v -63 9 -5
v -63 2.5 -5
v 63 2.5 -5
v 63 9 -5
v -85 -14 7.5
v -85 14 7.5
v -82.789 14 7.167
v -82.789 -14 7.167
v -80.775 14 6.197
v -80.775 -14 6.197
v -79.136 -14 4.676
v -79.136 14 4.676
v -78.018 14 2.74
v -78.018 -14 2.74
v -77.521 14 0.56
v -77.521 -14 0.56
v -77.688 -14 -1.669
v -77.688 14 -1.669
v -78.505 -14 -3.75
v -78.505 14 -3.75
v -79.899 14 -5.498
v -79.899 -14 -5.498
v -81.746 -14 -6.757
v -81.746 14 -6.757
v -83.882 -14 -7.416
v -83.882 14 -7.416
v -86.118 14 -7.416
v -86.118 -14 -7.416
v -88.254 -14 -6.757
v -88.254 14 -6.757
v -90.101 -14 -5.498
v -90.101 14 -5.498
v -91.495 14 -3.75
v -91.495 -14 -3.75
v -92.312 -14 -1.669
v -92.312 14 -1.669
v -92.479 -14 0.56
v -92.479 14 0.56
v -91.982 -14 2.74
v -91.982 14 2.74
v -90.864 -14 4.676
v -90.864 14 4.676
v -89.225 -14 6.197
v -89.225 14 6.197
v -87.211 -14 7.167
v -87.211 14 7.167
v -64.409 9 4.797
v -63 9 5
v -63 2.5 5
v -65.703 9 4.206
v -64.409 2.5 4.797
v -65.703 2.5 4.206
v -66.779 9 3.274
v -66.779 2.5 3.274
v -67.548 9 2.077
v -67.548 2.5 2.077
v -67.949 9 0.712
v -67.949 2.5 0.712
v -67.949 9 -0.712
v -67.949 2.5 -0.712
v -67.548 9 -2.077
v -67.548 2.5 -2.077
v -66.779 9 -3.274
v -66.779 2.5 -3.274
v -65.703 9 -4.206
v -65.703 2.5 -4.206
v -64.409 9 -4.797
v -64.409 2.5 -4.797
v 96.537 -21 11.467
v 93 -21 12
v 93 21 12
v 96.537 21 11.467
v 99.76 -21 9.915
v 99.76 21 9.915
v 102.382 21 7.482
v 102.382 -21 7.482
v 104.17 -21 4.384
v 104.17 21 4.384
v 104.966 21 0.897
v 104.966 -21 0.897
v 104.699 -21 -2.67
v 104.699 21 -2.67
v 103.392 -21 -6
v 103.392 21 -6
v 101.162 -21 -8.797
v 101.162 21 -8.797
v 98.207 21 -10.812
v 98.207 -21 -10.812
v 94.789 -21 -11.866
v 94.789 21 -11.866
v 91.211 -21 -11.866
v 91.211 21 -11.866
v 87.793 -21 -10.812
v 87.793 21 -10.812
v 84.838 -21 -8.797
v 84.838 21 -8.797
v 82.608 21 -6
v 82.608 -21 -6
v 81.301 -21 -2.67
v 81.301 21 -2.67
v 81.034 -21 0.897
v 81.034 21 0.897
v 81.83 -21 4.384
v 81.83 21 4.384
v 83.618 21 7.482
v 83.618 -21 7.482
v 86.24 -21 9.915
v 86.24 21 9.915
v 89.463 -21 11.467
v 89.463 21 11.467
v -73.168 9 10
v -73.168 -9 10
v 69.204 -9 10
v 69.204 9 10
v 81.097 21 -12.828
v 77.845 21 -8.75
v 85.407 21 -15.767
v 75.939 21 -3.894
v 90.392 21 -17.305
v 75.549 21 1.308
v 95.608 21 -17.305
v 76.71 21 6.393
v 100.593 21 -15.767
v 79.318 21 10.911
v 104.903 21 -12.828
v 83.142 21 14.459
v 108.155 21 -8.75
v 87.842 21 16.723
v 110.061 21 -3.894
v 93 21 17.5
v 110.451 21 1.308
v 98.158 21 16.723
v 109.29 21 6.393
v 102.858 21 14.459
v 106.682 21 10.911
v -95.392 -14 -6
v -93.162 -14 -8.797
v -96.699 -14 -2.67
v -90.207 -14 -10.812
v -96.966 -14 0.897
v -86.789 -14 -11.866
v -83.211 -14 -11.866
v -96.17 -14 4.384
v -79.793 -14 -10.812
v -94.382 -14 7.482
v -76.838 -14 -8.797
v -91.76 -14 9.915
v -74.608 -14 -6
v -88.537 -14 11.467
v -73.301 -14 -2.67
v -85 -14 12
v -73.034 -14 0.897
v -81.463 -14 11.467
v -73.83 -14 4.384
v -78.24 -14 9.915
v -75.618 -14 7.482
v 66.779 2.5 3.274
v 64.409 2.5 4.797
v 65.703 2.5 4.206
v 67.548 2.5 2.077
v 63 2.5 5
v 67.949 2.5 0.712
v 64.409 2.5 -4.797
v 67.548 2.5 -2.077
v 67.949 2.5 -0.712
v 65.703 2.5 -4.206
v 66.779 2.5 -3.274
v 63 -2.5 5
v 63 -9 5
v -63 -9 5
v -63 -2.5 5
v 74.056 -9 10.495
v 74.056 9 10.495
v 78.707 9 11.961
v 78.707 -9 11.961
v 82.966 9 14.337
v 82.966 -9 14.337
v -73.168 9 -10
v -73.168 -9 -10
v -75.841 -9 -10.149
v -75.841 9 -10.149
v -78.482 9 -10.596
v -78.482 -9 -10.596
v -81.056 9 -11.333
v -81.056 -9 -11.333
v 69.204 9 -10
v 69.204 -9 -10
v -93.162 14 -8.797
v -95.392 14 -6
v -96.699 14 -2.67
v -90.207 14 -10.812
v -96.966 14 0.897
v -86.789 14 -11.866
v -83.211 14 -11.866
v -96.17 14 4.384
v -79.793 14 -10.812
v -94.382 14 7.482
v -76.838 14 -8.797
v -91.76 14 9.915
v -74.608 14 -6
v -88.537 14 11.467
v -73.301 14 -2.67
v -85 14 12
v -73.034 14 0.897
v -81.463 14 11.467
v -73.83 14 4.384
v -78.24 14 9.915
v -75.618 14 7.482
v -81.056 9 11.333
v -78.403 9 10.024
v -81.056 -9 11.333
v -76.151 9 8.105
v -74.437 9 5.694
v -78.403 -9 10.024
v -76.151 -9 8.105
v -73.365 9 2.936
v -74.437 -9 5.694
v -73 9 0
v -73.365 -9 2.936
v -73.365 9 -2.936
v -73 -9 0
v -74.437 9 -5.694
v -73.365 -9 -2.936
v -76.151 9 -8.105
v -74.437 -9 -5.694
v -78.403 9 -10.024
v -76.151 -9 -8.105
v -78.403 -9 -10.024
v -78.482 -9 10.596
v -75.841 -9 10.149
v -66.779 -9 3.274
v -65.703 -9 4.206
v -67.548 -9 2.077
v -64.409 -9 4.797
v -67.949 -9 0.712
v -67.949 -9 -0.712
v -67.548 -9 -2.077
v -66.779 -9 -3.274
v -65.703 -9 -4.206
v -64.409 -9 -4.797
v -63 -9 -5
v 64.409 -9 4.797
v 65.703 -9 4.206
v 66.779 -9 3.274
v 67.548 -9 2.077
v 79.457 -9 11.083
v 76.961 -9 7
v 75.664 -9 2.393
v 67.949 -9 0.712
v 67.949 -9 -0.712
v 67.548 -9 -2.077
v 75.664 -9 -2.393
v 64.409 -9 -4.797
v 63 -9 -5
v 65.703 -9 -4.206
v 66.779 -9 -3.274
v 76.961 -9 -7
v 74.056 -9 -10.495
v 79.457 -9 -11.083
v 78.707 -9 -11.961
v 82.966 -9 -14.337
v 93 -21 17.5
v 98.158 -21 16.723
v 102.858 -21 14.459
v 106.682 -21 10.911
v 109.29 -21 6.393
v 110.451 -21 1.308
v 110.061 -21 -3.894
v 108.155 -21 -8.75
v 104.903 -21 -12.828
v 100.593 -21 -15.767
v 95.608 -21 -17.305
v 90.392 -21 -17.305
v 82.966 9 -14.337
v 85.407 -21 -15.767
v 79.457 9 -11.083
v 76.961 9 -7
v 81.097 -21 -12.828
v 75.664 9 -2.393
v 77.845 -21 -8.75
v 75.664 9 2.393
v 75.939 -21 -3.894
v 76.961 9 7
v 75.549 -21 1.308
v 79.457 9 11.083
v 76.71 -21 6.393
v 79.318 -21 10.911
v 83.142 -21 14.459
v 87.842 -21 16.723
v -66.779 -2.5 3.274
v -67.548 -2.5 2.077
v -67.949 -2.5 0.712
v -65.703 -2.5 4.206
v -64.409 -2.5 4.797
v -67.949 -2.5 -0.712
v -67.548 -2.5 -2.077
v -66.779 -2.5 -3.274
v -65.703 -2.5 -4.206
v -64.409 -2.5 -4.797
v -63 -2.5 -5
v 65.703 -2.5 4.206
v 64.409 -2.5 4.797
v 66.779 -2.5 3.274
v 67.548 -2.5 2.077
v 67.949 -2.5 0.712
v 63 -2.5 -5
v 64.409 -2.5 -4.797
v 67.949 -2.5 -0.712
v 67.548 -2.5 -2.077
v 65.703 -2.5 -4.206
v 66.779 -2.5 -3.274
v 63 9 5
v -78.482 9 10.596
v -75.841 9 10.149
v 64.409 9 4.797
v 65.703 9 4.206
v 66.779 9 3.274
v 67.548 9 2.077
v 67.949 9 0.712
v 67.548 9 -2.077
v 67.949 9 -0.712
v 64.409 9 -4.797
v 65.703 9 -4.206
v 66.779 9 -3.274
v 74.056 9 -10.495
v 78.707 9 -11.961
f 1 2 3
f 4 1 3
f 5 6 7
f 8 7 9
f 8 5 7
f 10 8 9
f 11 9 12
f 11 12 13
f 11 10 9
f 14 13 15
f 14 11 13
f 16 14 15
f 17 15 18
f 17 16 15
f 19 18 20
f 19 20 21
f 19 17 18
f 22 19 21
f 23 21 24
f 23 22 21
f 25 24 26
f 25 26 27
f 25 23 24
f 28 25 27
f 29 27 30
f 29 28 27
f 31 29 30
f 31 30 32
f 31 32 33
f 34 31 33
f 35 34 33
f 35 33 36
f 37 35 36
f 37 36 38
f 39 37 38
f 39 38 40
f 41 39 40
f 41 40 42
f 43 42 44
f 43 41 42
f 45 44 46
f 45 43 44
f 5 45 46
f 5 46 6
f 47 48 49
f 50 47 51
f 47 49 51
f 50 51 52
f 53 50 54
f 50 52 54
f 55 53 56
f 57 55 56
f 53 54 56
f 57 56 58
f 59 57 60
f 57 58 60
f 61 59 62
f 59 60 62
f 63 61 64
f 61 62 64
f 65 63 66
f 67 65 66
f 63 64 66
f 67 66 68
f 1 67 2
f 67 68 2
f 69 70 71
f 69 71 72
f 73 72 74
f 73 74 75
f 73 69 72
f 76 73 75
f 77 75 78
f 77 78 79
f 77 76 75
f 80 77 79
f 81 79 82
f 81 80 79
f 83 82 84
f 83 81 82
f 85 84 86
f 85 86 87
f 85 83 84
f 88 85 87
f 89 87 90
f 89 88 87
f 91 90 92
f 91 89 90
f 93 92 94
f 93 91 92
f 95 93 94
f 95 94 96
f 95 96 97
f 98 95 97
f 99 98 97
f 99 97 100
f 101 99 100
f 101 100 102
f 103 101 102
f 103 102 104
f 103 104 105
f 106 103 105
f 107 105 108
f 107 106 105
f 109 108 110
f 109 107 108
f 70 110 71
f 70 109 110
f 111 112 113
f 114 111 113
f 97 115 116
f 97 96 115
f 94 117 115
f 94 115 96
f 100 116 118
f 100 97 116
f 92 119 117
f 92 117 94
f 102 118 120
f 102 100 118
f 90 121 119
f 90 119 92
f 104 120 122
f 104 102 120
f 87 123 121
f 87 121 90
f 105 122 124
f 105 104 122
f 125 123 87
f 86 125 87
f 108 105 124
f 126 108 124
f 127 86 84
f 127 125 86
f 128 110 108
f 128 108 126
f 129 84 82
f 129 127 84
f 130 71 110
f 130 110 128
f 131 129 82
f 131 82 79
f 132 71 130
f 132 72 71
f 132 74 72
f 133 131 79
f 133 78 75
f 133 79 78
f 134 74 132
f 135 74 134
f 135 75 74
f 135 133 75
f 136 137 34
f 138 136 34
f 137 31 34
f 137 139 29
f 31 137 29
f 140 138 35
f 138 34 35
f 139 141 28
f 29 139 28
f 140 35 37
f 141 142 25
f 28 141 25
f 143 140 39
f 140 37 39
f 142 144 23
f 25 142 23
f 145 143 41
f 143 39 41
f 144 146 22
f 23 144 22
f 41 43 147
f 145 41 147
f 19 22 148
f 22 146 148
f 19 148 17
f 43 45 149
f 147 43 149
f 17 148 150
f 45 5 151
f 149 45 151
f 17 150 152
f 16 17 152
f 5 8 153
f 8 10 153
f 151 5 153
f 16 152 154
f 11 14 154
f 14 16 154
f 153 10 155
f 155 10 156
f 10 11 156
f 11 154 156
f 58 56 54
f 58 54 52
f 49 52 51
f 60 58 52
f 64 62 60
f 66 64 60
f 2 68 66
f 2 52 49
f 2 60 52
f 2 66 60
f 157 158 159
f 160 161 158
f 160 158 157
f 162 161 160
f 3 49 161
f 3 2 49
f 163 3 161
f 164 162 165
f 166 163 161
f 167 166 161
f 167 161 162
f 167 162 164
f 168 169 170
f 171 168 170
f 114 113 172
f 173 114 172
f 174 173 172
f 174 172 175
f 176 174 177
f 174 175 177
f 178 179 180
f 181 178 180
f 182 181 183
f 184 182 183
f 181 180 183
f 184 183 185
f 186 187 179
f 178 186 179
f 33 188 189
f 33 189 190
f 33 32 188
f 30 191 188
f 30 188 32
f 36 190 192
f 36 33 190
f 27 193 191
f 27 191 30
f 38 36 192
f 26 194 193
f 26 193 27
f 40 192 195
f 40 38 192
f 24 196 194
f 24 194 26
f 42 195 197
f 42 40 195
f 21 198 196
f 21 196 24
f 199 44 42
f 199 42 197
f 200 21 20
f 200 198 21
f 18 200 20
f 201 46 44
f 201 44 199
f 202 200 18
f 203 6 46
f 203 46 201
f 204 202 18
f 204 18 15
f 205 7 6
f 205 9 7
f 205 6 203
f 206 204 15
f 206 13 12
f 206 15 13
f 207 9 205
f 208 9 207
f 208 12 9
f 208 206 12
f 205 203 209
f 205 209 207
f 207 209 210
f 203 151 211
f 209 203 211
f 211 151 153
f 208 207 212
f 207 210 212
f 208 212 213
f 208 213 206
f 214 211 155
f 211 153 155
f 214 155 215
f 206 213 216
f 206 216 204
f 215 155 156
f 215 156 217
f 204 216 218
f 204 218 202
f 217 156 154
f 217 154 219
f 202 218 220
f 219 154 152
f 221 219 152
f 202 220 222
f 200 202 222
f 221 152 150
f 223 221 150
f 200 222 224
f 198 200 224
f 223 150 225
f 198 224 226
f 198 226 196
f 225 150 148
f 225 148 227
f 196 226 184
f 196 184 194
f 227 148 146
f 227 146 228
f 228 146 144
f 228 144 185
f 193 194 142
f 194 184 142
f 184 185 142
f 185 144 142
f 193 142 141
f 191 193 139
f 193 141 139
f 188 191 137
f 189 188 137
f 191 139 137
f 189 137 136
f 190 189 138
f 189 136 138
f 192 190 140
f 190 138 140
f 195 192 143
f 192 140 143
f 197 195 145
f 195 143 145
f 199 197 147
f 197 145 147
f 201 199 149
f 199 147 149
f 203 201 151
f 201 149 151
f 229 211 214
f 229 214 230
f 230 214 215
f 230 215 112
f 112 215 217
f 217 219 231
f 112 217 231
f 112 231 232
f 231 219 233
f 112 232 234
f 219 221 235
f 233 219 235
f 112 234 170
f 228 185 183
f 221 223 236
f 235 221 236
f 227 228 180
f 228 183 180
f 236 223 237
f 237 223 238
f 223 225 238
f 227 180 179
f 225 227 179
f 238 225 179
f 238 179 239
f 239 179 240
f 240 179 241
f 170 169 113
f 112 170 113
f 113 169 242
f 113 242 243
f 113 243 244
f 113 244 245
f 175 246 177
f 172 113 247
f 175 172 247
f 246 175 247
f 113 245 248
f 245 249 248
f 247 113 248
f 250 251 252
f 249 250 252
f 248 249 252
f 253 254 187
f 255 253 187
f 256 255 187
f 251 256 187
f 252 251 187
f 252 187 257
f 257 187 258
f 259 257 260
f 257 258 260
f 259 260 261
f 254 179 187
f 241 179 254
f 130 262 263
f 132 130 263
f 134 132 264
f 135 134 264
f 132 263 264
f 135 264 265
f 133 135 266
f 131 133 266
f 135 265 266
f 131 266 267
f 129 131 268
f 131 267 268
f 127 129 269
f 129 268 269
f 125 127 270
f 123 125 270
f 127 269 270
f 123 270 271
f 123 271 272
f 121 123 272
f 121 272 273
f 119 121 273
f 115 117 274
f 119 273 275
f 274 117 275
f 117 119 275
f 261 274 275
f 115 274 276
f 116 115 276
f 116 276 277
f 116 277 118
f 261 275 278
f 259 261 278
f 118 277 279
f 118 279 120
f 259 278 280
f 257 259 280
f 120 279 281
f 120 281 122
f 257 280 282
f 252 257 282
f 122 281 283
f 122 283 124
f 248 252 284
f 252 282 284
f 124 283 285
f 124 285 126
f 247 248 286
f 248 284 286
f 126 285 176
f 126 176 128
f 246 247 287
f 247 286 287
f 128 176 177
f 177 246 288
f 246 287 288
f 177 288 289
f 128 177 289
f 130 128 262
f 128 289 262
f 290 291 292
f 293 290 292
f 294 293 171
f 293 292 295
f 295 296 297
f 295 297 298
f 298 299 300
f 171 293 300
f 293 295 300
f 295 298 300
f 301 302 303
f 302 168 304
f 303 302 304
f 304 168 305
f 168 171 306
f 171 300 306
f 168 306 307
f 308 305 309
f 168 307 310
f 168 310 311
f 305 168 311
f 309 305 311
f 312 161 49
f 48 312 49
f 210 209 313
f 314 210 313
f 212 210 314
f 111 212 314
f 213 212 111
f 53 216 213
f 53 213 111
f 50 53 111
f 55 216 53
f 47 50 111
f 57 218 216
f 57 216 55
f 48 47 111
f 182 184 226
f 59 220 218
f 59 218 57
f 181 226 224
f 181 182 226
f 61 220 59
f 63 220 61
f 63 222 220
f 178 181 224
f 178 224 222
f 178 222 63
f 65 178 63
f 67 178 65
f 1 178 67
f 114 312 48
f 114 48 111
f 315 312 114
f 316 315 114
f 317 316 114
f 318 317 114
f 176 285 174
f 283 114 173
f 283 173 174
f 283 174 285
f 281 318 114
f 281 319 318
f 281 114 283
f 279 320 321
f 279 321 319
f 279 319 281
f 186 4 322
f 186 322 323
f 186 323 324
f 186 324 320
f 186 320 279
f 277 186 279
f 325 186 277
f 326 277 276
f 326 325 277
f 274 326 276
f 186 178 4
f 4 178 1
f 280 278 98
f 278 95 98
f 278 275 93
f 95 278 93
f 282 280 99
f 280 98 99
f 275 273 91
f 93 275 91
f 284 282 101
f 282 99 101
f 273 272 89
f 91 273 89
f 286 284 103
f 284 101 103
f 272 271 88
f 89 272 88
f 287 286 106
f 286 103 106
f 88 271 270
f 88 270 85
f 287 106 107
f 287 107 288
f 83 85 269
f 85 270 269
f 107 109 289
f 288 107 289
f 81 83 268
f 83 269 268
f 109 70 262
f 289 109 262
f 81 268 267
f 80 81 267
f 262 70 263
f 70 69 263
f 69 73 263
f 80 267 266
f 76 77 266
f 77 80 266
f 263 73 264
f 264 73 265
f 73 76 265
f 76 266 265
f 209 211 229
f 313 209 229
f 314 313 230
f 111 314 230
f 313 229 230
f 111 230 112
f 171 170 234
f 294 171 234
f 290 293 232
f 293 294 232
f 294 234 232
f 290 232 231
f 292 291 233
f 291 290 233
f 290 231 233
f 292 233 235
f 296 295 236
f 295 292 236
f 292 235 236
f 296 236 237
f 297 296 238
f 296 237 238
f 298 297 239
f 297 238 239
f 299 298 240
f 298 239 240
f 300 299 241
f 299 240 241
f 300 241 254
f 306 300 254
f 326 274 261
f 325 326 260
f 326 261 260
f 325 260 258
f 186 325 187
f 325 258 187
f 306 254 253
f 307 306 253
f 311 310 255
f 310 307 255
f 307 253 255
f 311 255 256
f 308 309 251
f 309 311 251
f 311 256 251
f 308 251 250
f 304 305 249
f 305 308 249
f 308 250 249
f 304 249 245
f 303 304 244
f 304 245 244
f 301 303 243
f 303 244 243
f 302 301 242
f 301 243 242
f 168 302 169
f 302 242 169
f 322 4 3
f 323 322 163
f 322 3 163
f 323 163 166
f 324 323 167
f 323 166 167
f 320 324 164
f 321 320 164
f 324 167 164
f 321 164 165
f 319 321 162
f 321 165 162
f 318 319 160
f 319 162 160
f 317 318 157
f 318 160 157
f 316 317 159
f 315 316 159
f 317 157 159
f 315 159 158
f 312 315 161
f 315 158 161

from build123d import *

# Parameters (mm, degrees)
BOSS_EXTRUDE1_DEPTH      = 21
BOSS_EXTRUDE1_DEPTH_BACK = 21
SKETCH1_R                = 12
BOSS_EXTRUDE2_DEPTH      = 9
BOSS_EXTRUDE2_DEPTH_BACK = 9
BOSS_EXTRUDE3_DEPTH      = 14
BOSS_EXTRUDE3_DEPTH_BACK = 14
SKETCH1_4_R              = 7.5
BOSS_EXTRUDE4_DEPTH      = 2.5
BOSS_EXTRUDE4_DEPTH_BACK = 2.5


with BuildPart() as part:
    # Sketch1 → Boss-Extrude1 (new, two sides: drawn at the far end of the back side and taken through both)
    with BuildSketch(Plane(origin=(0, 0, 0), x_dir=(1, 0, 0), z_dir=(0, 1, 0)).offset(-BOSS_EXTRUDE1_DEPTH_BACK)):
        with BuildLine():
            ThreePointArc((110.5, 0), (101.082293252, 15.521808393), (82.965538766, 14.337349398))
            ThreePointArc((82.965538766, 14.337349398), (75.5, 0), (82.965538766, -14.337349398))
            ThreePointArc((82.965538766, -14.337349398), (101.082293252, -15.521808393), (110.5, 0))
        make_face()
        with Locations((93, 0)):
            Circle(SKETCH1_R, mode=Mode.SUBTRACT)
    extrude(amount=BOSS_EXTRUDE1_DEPTH + BOSS_EXTRUDE1_DEPTH_BACK)

    # Sketch1<3> → Boss-Extrude2 (add, two sides: drawn at the far end of the back side and taken through both)
    with BuildSketch(Plane(origin=(0, 0, 0), x_dir=(1, 0, 0), z_dir=(0, 1, 0)).offset(-BOSS_EXTRUDE2_DEPTH_BACK)):
        with BuildLine():
            Line((69.203991931, 10), (-73.167840434, 10))
            ThreePointArc((-73.167840434, 10), (-77.167840434, 10.335680868), (-81.055946811, 11.333333333))
            ThreePointArc((-81.055946811, 11.333333333), (-75.219186172, 6.952386703), (-73, 0))
            ThreePointArc((-73, 0), (-75.219186172, -6.952386703), (-81.055946811, -11.333333333))
            ThreePointArc((-81.055946811, -11.333333333), (-77.167840434, -10.335680868), (-73.167840434, -10))
            Line((-73.167840434, -10), (69.203991931, -10))
            ThreePointArc((69.203991931, -10), (76.418435276, -11.110006395), (82.965538766, -14.337349398))
            ThreePointArc((82.965538766, -14.337349398), (75.5, 0), (82.965538766, 14.337349398))
            ThreePointArc((82.965538766, 14.337349398), (76.418435276, 11.110006395), (69.203991931, 10))
        make_face()
        with BuildLine():
            Line((63, -5), (-63, -5))
            ThreePointArc((-63, -5), (-68, 0), (-63, 5))
            Line((-63, 5), (63, 5))
            ThreePointArc((63, 5), (68, 0), (63, -5))
        make_face(mode=Mode.SUBTRACT)
    extrude(amount=BOSS_EXTRUDE2_DEPTH + BOSS_EXTRUDE2_DEPTH_BACK)

    # Sketch1<4> → Boss-Extrude3 (add, two sides: drawn at the far end of the back side and taken through both)
    with BuildSketch(Plane(origin=(0, 0, 0), x_dir=(1, 0, 0), z_dir=(0, 1, 0)).offset(-BOSS_EXTRUDE3_DEPTH_BACK)):
        with BuildLine():
            ThreePointArc((-73, 0), (-75.219186172, 6.952386703), (-81.055946811, 11.333333333))
            ThreePointArc((-81.055946811, 11.333333333), (-97, 0), (-81.055946811, -11.333333333))
            ThreePointArc((-81.055946811, -11.333333333), (-75.219186172, -6.952386703), (-73, 0))
        make_face()
        with Locations((-85, 0)):
            Circle(SKETCH1_4_R, mode=Mode.SUBTRACT)
    extrude(amount=BOSS_EXTRUDE3_DEPTH + BOSS_EXTRUDE3_DEPTH_BACK)

    # Sketch1<5> → Boss-Extrude4 (add, two sides: drawn at the far end of the back side and taken through both)
    with BuildSketch(Plane(origin=(0, 0, 0), x_dir=(1, 0, 0), z_dir=(0, 1, 0)).offset(-BOSS_EXTRUDE4_DEPTH_BACK)):
        with BuildLine():
            ThreePointArc((-63, 5), (-68, 0), (-63, -5))
            Line((-63, -5), (63, -5))
            ThreePointArc((63, -5), (68, 0), (63, 5))
            Line((63, 5), (-63, 5))
        make_face()
    extrude(amount=BOSS_EXTRUDE4_DEPTH + BOSS_EXTRUDE4_DEPTH_BACK)


solid = part.part
